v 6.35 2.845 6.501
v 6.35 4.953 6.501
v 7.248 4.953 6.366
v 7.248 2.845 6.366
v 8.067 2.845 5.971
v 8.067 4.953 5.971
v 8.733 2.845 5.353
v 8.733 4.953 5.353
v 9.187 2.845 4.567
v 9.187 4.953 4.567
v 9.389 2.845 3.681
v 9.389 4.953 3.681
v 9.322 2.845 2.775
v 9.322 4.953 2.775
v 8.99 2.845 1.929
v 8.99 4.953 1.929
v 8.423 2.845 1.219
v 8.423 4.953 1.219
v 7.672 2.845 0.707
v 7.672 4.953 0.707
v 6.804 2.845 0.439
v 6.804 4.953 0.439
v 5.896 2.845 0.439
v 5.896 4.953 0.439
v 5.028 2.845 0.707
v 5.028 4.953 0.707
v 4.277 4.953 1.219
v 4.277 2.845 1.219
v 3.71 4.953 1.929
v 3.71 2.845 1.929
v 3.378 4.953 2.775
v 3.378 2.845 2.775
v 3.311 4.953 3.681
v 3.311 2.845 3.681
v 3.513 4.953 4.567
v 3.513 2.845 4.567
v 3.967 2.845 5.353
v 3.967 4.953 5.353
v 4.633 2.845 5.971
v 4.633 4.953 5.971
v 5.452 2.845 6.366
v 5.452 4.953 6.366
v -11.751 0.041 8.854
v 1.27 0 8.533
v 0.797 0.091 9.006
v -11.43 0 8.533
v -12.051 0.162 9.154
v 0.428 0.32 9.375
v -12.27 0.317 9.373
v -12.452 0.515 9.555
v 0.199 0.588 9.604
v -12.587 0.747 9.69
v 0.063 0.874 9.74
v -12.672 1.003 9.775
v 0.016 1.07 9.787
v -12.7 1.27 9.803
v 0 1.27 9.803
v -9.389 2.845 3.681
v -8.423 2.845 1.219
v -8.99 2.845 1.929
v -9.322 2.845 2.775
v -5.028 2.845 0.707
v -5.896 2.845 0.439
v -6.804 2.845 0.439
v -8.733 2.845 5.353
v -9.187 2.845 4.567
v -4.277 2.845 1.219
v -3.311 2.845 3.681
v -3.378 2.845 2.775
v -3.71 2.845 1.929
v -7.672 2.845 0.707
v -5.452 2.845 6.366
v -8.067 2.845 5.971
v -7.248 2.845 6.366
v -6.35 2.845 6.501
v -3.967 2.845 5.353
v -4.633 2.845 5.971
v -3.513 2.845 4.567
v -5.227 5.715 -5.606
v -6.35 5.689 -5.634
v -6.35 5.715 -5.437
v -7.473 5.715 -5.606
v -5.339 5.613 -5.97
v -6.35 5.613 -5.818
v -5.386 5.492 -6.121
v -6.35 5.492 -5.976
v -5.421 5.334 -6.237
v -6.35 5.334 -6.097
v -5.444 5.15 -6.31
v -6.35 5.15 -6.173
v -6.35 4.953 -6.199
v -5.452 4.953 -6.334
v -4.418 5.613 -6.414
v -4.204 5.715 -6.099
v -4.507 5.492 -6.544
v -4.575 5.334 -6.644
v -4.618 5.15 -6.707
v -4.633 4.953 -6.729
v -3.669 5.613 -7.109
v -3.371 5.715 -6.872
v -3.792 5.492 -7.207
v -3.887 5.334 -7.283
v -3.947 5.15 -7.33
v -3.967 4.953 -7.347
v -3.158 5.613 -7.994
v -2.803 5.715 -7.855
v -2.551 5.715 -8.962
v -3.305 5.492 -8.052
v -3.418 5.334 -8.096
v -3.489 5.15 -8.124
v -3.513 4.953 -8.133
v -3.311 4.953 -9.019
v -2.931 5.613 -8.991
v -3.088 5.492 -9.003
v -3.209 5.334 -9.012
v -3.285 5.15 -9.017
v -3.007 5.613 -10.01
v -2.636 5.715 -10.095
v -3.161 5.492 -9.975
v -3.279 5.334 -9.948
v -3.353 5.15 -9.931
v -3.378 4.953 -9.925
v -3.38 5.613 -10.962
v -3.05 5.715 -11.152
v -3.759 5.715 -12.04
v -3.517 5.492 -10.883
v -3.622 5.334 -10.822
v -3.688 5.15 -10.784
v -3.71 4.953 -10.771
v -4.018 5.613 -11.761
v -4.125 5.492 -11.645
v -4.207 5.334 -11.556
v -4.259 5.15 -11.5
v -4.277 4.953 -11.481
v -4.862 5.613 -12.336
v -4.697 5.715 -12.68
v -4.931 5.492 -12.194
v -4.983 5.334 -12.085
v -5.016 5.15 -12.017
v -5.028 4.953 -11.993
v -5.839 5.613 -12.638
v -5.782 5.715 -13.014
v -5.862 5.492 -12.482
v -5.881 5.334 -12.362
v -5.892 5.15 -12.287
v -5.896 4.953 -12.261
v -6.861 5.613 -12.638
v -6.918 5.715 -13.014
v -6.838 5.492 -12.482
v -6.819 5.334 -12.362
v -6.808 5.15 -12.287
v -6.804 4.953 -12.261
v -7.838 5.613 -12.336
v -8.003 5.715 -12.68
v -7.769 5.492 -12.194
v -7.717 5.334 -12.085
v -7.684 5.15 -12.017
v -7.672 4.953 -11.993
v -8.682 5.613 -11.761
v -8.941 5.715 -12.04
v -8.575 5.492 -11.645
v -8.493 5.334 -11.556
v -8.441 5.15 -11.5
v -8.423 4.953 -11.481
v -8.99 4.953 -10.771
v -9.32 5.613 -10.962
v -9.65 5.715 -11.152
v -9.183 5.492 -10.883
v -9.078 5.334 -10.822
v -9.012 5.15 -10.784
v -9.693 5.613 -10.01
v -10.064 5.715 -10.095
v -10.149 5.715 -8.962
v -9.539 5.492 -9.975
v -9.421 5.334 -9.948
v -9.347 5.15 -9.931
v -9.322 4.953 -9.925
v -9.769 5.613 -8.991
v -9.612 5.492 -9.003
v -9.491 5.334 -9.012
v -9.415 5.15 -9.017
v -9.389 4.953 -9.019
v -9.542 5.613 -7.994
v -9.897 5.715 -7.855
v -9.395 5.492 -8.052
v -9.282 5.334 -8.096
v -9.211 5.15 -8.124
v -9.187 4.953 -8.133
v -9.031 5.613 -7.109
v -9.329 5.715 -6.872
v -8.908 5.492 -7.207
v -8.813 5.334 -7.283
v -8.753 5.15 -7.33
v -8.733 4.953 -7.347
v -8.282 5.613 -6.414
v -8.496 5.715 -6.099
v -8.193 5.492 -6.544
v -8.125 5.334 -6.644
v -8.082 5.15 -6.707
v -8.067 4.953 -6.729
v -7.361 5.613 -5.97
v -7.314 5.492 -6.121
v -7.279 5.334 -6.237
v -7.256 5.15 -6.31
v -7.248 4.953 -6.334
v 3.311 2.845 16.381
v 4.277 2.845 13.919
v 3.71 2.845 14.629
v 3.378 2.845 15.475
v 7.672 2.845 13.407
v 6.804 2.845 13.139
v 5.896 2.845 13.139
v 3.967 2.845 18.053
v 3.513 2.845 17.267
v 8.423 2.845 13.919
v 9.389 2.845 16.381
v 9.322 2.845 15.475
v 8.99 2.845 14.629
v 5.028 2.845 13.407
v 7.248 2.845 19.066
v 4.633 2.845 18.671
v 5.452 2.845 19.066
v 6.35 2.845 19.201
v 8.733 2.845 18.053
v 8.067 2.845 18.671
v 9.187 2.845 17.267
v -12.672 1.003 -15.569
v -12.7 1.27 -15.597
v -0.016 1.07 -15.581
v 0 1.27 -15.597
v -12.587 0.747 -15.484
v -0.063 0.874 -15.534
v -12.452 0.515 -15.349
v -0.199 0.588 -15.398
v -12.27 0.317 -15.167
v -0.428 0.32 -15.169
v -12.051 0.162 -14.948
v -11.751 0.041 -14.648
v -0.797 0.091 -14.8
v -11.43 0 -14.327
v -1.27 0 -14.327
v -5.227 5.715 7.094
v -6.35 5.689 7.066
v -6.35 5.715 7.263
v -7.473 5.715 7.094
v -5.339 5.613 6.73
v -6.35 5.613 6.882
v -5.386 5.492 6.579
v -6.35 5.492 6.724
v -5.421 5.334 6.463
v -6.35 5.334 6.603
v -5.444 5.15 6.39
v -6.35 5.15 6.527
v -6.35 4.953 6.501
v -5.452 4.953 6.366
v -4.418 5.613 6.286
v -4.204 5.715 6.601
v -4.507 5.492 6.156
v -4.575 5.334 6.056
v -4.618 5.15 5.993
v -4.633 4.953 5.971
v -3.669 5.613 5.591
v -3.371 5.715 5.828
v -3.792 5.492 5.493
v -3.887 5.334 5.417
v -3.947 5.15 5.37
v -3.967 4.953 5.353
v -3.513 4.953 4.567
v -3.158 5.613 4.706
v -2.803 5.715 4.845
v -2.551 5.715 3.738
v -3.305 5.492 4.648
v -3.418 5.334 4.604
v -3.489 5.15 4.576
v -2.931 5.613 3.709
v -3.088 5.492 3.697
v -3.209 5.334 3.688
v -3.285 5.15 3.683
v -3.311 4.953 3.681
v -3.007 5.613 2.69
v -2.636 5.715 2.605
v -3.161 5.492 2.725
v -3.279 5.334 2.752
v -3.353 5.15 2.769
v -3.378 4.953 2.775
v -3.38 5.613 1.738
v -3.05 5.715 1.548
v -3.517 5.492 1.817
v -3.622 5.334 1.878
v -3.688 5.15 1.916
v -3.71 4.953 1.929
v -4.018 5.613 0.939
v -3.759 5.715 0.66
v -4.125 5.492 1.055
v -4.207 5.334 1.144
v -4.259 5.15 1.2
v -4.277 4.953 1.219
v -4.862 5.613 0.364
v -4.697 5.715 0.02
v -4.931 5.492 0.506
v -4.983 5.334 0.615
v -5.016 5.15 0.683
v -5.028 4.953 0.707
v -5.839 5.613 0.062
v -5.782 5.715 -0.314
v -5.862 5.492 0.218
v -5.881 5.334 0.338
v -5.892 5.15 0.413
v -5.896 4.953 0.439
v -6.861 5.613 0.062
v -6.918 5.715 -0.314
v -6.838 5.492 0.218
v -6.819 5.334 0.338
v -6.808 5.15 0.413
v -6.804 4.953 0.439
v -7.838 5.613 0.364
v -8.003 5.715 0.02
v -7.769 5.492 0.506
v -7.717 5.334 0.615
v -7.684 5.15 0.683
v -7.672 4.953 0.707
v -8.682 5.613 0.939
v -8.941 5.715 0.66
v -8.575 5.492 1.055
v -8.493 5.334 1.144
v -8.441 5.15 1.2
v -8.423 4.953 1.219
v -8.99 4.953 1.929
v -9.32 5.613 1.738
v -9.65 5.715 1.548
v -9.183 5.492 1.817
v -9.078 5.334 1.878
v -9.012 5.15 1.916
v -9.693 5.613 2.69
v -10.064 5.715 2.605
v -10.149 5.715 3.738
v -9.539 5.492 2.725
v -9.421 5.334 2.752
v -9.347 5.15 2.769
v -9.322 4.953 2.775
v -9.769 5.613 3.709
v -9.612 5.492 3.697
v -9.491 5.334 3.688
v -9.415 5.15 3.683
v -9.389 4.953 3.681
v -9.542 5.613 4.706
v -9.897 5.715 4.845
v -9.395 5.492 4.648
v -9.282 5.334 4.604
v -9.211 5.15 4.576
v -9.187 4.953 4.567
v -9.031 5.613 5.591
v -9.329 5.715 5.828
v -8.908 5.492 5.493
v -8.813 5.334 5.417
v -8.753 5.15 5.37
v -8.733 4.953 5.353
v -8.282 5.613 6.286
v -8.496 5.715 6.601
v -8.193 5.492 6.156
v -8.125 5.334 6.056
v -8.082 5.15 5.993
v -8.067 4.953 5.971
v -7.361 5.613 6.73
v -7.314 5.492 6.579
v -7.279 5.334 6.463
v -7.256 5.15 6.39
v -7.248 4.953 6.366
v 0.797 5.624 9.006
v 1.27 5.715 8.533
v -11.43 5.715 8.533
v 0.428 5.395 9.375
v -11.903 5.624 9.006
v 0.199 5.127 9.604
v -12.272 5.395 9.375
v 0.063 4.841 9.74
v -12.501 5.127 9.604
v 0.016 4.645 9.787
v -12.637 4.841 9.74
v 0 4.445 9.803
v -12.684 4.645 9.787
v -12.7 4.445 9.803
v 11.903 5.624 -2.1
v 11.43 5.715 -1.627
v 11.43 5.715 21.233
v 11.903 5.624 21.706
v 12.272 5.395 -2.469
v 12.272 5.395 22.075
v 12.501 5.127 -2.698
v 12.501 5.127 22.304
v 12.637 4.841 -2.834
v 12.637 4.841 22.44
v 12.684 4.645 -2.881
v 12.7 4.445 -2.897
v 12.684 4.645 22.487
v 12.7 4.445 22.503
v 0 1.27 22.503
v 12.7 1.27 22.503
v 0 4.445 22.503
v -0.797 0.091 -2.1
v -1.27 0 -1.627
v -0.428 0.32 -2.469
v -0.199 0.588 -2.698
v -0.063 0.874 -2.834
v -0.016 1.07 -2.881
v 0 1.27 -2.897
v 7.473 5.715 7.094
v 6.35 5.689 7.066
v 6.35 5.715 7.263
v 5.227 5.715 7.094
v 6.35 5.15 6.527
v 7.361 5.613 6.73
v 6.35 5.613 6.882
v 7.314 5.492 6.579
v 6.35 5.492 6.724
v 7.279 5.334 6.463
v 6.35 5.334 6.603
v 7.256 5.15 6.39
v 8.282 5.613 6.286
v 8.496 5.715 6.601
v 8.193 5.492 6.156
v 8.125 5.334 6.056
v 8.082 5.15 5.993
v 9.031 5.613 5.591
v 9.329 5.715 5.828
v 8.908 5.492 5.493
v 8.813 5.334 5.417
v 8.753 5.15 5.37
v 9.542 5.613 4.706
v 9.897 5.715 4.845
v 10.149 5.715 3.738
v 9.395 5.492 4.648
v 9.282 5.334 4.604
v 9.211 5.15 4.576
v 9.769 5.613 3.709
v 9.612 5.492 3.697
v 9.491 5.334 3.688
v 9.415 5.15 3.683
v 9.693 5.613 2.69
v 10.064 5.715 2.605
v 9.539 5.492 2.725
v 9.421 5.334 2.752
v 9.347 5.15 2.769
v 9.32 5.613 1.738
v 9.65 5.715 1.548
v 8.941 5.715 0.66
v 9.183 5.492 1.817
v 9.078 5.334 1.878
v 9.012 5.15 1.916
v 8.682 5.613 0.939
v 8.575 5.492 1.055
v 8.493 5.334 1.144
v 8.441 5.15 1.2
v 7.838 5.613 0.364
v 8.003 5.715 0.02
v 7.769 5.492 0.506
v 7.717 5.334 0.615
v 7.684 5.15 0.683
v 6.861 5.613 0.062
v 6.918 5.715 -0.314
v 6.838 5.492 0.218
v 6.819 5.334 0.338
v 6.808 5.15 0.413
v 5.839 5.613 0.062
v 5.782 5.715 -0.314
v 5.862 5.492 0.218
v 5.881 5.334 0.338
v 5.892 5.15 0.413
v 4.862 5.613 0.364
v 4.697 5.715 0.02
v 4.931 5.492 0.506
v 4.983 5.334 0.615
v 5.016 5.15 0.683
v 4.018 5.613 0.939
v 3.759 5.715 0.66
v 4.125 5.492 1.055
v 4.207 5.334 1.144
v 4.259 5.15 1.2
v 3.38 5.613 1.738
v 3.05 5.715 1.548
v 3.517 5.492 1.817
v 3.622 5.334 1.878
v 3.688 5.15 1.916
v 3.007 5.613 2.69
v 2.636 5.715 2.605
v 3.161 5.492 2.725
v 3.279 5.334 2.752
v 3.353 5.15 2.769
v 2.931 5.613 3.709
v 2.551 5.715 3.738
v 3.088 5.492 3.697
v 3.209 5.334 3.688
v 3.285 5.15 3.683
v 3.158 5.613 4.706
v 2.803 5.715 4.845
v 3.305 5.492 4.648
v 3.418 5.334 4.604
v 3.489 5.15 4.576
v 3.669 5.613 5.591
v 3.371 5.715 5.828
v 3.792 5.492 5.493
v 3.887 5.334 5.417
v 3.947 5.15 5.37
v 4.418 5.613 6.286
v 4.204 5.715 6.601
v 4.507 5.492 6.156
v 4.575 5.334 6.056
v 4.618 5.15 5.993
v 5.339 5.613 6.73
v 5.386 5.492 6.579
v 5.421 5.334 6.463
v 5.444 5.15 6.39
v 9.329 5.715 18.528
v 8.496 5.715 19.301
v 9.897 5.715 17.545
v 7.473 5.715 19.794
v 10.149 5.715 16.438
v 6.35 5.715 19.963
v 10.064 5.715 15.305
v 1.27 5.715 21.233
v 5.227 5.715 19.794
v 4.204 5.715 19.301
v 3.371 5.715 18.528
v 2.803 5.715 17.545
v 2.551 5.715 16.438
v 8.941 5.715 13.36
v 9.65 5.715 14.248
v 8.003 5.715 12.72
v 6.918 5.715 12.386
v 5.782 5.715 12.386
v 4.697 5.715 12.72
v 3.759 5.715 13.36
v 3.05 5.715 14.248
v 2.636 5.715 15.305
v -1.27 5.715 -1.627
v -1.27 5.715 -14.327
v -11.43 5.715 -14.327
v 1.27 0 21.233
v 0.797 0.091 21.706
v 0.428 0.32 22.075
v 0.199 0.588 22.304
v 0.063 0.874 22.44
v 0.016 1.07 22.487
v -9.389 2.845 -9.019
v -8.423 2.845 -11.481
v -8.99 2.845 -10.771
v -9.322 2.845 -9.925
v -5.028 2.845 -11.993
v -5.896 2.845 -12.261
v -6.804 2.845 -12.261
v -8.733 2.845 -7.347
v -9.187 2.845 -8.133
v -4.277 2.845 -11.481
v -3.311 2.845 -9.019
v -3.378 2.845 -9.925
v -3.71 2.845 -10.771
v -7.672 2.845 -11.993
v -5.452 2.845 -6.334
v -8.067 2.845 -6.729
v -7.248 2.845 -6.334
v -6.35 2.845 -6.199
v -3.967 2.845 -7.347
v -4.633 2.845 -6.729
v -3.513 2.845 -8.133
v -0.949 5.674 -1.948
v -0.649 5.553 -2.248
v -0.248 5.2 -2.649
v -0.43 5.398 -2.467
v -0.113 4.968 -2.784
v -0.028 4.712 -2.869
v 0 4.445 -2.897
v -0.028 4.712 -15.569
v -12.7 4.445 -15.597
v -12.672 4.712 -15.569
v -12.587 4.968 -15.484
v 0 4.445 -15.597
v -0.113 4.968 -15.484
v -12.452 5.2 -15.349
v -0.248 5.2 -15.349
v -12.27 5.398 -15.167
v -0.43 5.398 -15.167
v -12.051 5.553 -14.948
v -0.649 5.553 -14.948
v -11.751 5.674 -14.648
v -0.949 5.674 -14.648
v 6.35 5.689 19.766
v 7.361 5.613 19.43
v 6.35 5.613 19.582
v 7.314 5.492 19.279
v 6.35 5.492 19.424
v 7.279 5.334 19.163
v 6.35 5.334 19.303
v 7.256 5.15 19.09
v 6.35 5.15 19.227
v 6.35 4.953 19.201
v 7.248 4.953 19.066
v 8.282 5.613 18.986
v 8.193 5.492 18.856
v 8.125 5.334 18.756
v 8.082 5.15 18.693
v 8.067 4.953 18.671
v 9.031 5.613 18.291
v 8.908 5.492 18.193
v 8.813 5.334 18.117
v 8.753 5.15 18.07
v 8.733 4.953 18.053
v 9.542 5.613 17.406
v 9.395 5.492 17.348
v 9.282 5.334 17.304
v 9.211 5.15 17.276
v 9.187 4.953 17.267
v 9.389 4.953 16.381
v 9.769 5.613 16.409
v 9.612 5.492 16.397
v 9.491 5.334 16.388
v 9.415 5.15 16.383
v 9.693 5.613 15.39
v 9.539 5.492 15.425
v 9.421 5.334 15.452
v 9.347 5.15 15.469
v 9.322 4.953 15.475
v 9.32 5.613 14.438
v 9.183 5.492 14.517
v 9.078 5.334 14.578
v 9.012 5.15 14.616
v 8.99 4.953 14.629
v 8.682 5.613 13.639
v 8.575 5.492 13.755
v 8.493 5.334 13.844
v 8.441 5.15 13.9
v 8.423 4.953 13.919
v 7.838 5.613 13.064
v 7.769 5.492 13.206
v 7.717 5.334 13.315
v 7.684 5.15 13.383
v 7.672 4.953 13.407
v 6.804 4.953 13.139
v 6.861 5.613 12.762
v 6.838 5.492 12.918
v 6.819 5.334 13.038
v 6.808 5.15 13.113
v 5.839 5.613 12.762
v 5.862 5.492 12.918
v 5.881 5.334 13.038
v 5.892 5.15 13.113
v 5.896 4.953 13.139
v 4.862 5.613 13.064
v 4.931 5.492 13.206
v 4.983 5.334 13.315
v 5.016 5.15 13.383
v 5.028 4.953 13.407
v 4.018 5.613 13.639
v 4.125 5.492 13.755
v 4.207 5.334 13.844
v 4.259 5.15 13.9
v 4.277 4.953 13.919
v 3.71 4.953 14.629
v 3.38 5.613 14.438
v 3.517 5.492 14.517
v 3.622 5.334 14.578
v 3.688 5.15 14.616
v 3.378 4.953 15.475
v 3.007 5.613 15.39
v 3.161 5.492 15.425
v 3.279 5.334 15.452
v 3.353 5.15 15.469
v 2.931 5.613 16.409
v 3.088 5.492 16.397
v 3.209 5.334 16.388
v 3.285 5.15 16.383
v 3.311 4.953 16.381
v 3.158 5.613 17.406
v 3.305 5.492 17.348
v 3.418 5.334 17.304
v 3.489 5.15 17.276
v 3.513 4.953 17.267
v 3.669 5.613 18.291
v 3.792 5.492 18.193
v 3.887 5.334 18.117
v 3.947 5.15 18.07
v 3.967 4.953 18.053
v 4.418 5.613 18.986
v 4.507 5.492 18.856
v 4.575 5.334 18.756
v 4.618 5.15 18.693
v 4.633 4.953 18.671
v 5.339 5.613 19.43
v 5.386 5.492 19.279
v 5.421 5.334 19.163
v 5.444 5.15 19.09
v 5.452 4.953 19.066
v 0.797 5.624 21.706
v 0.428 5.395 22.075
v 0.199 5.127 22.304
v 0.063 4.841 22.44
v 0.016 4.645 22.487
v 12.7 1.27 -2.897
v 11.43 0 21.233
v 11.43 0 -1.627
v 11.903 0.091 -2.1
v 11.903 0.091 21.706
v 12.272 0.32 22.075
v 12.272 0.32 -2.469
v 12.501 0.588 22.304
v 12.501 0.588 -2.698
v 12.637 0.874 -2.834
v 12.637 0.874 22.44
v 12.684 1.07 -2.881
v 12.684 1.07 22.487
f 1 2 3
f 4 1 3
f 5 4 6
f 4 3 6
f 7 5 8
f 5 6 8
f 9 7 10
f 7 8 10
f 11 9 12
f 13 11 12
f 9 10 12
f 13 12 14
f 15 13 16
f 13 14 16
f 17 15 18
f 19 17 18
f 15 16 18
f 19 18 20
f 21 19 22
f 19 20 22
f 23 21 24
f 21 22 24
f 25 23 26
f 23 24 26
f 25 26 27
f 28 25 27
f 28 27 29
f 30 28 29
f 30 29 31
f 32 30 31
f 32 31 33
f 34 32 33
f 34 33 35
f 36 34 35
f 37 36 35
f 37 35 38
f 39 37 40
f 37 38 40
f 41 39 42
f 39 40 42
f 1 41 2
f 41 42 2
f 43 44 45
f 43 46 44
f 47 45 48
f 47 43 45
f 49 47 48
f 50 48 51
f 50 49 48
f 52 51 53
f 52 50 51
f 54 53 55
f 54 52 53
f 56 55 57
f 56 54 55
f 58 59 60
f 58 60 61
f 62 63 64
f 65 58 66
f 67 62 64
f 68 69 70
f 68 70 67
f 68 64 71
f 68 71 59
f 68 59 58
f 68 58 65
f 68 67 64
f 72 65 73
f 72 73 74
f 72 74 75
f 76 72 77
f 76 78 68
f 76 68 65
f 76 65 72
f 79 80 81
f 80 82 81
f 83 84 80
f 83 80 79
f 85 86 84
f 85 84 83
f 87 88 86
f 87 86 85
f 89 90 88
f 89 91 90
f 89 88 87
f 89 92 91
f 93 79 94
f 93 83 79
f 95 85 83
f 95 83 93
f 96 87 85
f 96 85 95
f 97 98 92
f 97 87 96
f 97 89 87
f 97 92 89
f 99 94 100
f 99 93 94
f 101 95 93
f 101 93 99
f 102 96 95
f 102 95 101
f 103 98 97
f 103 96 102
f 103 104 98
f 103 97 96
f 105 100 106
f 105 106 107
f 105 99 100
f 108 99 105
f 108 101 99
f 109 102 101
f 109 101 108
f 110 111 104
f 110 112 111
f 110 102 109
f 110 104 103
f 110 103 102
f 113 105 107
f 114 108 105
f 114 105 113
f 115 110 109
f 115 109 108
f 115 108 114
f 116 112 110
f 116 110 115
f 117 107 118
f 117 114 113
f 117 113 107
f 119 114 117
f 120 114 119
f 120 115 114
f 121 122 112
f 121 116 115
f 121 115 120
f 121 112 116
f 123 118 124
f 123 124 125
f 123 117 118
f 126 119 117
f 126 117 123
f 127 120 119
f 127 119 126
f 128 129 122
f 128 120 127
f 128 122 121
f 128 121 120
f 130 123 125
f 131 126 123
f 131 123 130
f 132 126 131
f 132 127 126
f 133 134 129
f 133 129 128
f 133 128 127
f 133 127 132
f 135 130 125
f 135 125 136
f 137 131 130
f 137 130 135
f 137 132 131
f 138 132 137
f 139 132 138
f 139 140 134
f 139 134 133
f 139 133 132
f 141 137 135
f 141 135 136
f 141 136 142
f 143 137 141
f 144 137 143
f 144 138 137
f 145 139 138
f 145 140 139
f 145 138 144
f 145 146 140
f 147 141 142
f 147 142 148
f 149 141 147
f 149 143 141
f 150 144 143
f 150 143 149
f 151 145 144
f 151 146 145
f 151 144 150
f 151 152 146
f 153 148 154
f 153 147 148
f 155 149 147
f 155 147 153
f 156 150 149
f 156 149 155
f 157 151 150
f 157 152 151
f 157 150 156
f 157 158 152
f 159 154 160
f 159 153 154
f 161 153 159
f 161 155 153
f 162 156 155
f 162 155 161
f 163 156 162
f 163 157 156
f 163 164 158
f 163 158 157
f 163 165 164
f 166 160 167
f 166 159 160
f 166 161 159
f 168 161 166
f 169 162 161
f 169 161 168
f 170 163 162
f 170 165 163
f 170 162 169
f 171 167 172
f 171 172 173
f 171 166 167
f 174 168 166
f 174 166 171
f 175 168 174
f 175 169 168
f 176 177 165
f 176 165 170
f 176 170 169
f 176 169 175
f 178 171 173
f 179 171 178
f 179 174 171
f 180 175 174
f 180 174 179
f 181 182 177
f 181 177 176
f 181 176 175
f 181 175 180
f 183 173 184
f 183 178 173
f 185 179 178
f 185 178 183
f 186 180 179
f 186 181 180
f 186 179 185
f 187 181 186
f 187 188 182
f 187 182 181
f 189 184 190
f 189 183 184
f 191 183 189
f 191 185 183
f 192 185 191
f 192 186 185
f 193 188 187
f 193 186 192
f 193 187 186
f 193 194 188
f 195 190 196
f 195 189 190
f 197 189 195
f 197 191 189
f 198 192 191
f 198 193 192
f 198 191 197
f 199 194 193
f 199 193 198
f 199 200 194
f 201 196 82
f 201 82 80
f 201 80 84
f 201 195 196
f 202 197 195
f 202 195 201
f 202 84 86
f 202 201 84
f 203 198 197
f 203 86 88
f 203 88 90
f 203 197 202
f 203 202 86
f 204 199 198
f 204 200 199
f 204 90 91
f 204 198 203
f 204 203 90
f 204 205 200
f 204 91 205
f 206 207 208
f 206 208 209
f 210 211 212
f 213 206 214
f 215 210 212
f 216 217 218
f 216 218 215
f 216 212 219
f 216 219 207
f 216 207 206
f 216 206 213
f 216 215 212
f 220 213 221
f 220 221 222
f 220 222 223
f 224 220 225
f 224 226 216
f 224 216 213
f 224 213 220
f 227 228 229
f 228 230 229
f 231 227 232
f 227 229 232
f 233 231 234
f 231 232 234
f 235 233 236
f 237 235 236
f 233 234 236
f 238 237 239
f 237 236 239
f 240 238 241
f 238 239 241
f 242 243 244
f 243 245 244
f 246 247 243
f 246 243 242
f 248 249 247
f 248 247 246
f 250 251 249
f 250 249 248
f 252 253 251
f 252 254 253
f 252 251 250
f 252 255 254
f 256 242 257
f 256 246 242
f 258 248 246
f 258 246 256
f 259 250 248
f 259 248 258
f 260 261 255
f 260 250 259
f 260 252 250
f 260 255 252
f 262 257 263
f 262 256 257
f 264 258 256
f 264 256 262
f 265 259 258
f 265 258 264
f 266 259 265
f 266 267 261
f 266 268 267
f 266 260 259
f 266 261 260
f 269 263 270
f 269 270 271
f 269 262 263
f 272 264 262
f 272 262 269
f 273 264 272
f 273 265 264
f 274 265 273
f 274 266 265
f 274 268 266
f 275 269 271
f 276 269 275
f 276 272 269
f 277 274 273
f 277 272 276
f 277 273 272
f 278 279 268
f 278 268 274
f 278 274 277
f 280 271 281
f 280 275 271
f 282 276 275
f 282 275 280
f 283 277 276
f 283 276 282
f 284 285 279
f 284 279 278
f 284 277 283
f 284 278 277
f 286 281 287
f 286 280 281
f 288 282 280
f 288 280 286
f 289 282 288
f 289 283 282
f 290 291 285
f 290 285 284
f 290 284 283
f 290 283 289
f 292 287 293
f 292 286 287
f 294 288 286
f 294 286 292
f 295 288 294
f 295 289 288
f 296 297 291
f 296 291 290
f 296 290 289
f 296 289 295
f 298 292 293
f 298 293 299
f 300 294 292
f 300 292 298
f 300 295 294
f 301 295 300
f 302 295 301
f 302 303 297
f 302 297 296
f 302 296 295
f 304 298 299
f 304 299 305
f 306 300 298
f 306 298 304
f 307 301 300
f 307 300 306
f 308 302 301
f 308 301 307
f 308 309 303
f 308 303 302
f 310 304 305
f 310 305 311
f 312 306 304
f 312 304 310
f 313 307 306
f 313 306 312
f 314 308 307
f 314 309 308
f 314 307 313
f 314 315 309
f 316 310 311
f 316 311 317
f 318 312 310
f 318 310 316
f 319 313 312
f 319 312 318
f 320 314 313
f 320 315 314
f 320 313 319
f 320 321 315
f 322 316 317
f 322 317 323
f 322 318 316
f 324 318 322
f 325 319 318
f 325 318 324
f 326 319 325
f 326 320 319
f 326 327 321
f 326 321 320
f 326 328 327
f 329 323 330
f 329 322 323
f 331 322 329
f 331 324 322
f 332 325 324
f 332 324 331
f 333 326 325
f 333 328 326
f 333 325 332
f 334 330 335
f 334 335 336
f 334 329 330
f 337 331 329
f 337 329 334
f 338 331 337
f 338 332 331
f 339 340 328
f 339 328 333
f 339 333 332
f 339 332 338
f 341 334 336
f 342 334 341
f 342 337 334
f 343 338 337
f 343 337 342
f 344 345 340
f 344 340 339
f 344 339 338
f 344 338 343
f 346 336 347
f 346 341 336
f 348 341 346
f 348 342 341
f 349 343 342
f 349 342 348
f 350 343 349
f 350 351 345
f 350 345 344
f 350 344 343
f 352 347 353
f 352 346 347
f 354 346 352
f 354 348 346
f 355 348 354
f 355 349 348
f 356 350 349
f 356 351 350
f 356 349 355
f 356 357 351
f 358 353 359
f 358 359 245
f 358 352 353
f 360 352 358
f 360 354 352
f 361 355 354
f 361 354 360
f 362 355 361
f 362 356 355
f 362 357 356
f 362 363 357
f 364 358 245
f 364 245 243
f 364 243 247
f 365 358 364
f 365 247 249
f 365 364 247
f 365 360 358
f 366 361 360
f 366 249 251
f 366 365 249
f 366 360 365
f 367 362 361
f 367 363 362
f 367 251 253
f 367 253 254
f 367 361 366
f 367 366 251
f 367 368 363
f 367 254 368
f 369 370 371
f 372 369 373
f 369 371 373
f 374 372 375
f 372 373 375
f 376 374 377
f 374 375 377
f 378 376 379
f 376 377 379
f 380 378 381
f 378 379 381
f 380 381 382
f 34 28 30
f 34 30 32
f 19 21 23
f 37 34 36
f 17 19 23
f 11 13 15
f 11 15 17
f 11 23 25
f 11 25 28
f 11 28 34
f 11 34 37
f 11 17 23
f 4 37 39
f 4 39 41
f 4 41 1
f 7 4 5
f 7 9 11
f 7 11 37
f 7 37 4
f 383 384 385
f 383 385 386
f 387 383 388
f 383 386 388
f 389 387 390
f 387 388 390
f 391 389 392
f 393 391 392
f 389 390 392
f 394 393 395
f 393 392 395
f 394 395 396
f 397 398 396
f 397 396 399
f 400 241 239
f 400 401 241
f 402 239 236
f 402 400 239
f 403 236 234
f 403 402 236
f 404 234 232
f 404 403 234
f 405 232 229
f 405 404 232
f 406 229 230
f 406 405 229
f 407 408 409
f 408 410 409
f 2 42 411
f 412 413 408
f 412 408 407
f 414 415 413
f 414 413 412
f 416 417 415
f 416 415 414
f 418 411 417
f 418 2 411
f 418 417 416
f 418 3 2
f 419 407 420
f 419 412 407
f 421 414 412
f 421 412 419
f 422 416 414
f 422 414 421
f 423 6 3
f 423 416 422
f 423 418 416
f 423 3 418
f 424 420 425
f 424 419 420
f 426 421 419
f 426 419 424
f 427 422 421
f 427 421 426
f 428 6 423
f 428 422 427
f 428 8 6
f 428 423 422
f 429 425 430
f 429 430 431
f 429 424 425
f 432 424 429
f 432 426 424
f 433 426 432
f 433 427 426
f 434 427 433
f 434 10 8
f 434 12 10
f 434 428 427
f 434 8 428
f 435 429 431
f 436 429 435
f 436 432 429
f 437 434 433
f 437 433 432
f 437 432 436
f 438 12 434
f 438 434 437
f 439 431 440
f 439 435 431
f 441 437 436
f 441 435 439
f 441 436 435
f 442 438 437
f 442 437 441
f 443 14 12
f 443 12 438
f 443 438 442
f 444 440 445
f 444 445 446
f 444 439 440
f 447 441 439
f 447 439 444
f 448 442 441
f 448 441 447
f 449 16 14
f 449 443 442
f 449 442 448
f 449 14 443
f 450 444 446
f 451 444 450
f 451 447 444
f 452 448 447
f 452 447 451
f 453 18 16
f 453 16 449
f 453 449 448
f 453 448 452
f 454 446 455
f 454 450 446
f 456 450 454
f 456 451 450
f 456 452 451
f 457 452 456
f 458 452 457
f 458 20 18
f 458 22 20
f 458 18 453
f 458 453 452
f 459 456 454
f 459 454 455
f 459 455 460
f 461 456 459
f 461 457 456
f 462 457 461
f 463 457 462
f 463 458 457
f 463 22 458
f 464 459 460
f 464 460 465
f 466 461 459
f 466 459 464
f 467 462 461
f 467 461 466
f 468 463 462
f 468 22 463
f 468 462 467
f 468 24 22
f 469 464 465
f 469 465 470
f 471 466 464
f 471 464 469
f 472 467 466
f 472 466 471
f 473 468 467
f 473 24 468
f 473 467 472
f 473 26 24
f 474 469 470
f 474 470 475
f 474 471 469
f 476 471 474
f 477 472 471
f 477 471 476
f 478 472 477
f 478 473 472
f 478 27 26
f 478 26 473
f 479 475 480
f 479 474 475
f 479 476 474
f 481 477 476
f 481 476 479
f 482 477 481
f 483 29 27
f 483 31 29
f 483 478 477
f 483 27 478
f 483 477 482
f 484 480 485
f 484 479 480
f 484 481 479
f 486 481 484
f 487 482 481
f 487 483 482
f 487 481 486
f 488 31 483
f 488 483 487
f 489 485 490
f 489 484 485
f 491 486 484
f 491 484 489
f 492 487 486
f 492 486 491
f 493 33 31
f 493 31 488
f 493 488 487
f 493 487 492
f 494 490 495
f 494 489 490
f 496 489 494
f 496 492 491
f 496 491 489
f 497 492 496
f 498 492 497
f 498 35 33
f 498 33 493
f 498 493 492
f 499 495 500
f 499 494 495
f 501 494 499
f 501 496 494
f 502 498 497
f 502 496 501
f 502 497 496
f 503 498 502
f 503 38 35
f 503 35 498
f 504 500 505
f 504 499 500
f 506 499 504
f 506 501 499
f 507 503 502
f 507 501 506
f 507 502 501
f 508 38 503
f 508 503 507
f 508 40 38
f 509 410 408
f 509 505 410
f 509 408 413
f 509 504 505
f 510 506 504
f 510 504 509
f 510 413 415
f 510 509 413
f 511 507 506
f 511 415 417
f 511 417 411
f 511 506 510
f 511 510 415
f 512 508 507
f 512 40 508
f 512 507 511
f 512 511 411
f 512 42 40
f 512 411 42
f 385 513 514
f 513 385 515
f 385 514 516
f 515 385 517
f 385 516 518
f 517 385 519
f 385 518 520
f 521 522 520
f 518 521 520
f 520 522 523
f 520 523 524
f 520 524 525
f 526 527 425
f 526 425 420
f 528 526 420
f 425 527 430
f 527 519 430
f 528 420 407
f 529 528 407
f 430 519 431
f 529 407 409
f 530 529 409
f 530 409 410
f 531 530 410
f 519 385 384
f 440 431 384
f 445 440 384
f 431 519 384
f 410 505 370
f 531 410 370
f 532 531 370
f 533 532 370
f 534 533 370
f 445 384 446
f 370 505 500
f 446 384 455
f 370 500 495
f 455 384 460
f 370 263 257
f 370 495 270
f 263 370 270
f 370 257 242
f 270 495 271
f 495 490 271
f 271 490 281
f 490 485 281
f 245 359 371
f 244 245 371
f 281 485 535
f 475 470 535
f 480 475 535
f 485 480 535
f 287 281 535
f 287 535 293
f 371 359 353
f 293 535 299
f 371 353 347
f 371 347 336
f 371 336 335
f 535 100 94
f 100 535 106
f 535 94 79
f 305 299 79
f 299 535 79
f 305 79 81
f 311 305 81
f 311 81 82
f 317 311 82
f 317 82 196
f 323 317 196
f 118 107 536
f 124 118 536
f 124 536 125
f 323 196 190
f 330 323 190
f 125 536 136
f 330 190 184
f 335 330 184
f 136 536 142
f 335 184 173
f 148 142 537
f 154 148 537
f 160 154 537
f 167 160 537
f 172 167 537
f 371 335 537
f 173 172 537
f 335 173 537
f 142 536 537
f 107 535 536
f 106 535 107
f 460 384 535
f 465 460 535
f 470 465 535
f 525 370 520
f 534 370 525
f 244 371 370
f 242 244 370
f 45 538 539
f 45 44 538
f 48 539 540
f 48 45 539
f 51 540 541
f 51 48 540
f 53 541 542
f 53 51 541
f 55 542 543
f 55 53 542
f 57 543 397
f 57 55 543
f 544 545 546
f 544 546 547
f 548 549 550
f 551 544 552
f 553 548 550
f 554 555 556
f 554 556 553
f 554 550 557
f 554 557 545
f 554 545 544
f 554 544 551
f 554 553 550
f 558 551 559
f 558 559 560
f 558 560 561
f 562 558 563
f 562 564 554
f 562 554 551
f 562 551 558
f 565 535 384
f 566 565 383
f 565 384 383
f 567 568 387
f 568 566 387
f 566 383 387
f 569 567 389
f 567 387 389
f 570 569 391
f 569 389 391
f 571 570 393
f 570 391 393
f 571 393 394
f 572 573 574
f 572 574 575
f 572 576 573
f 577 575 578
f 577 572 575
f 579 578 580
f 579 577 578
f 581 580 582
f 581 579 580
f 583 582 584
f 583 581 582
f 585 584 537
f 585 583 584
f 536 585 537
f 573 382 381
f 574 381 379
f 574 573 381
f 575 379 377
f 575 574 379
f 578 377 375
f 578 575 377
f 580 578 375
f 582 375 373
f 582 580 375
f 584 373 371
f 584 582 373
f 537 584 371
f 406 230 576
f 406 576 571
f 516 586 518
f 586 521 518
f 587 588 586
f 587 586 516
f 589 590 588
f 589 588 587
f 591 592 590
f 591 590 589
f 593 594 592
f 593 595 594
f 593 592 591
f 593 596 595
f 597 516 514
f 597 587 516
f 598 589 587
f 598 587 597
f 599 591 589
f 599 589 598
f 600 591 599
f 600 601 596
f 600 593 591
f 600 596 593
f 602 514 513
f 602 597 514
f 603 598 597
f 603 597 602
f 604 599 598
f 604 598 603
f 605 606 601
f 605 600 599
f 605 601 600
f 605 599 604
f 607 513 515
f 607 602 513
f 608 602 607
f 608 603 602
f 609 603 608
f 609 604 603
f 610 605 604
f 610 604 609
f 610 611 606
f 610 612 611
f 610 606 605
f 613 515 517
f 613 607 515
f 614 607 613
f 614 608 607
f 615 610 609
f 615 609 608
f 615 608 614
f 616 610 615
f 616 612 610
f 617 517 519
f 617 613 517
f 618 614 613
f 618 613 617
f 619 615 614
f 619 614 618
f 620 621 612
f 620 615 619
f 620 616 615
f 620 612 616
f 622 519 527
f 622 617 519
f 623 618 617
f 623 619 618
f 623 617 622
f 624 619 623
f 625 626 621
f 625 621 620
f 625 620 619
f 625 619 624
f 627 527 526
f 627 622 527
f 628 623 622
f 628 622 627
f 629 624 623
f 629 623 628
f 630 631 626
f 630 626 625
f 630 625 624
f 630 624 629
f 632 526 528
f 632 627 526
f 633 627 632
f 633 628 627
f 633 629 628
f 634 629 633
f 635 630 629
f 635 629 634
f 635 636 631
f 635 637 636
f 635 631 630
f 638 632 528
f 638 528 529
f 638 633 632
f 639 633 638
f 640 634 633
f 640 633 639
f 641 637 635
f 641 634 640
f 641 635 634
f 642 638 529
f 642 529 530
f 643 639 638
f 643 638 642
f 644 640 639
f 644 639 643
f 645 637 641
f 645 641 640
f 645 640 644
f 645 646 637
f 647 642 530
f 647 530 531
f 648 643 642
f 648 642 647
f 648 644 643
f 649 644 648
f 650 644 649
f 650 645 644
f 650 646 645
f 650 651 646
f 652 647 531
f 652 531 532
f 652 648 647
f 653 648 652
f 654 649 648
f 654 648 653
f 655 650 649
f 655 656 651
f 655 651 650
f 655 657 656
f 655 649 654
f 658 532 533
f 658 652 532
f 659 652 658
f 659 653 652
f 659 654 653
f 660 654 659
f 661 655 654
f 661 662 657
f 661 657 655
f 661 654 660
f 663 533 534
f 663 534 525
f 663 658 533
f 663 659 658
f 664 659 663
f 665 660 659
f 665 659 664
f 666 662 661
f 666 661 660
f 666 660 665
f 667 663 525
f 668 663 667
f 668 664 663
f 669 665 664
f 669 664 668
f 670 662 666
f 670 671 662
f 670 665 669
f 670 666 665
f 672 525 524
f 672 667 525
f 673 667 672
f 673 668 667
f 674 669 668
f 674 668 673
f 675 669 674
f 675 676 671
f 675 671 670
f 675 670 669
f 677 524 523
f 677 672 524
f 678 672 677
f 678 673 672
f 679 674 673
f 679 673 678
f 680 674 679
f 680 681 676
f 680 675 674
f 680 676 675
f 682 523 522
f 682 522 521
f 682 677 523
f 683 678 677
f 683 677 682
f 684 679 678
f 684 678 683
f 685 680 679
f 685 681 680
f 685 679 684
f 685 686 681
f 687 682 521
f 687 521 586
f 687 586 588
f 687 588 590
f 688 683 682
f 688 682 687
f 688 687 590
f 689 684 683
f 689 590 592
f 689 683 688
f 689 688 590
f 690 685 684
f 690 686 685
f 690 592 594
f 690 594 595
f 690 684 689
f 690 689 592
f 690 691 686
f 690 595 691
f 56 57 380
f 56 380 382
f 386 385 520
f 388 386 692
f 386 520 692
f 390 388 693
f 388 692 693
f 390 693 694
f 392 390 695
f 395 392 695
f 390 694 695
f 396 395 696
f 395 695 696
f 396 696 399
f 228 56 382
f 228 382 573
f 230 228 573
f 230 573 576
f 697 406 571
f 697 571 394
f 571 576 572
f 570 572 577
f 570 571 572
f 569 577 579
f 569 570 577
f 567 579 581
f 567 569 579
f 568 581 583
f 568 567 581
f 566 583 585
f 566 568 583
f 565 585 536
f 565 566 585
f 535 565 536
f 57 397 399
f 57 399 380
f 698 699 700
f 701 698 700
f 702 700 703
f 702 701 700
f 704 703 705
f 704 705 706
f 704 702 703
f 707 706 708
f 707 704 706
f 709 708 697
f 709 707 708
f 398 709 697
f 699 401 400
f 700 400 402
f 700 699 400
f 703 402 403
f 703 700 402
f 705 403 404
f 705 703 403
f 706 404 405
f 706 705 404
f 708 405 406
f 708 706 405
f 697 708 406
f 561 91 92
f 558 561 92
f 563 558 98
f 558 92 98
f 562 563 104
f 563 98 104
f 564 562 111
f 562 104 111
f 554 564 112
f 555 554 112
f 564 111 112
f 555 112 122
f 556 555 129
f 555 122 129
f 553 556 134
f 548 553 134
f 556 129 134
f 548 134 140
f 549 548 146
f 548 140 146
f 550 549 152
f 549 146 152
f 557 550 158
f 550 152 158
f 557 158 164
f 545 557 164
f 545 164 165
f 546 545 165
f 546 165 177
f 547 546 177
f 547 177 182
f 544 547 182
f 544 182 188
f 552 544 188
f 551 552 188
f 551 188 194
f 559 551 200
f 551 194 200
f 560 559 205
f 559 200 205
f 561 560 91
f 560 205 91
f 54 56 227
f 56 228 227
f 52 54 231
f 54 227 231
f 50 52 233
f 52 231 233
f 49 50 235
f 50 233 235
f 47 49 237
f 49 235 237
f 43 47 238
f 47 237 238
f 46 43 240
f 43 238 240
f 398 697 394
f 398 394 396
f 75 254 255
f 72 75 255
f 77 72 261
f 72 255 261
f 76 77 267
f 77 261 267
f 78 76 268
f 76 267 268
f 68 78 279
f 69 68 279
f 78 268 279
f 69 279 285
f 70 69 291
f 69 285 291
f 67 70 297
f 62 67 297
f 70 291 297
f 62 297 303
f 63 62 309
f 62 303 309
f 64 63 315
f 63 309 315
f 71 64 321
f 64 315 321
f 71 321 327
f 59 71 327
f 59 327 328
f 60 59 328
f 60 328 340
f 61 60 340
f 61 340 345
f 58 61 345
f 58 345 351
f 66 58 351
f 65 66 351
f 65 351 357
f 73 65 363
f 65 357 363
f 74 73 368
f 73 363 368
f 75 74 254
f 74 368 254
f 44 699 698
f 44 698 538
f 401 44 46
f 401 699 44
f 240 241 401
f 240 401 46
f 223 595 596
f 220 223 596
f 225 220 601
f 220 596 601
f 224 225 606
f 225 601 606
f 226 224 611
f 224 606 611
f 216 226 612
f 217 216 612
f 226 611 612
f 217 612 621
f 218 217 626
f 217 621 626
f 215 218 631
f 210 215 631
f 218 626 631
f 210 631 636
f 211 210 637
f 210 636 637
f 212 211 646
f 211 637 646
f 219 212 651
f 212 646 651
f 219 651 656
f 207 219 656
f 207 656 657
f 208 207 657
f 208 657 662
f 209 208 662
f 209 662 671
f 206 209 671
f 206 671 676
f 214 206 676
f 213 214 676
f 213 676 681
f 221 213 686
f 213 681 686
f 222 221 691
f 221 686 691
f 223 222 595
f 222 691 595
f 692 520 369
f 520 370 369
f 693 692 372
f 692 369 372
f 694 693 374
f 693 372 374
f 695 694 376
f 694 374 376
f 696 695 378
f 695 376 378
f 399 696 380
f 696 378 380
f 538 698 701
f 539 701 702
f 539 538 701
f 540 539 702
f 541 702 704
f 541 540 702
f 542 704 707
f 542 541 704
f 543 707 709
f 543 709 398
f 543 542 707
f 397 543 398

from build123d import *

# Parameters (mm, degrees)
BOSS_EXTRUDE2_DEPTH = 5.715
SKETCH2_R           = 3.048
CUT_EXTRUDE1_DEPTH  = 2.8702
FILLET1_R           = 1.27
FILLET2_R           = 1.27
FILLET3_R           = 0.762


with BuildPart() as part:
    # Sketch1 → Boss-Extrude2 (new body)
    with BuildSketch(Plane(origin=(0, 0, 0), x_dir=(1, 0, 0), z_dir=(0, 1, 0))):
        Polygon((-12.7, 15.59701387), (0, 15.59701387), (0, 2.89701387), (12.7, 2.89701387), (12.7, -22.50298613), (0, -22.50298613), (0, -9.80298613), (-12.7, -9.80298613), align=None)
    extrude(amount=BOSS_EXTRUDE2_DEPTH)

    # Sketch2 → Cut-Extrude1 (cut)
    with BuildSketch(Plane(origin=(0, 5.715, 0), x_dir=(1, 0, 0), z_dir=(0, 1, 0))):
        with Locations(Location((-6.35, 9.24701387, 0), (0, 0, 270))):
            Circle(SKETCH2_R)
        with Locations(Location((6.35, -16.15298613, 0), (0, 0, 270))):
            Circle(SKETCH2_R)
        with Locations(Location((-6.35, -3.45298613, 0), (0, 0, 270))):
            Circle(SKETCH2_R)
        with Locations(Location((6.35, -3.45298613, 0), (0, 0, 270))):
            Circle(SKETCH2_R)
    extrude(amount=-CUT_EXTRUDE1_DEPTH, mode=Mode.SUBTRACT)

    # Fillet1
    fillet1_edges = [part.edges().sort_by_distance(p)[0] for p in [
        (-6.35, 5.715, -15.59701387),
        (0, 5.715, -9.24701387),
        (6.35, 5.715, -2.89701387),
        (12.7, 5.715, 9.80298613),
        (6.35, 5.715, 22.50298613),
        (0, 5.715, 16.15298613),
        (-6.35, 5.715, 9.80298613),
        (-12.7, 5.715, -2.89701387),
    ]]
    fillet(fillet1_edges, radius=FILLET1_R)

    # Fillet2
    fillet2_edges = [part.edges().sort_by_distance(p)[0] for p in [
        (-12.7, 0, -2.89701387),
        (-6.35, 0, 9.80298613),
        (0, 0, 16.15298613),
        (6.35, 0, 22.50298613),
        (12.7, 0, 9.80298613),
        (6.35, 0, -2.89701387),
        (0, 0, -9.24701387),
        (-6.35, 0, -15.59701387),
    ]]
    fillet(fillet2_edges, radius=FILLET2_R)

    # Fillet3
    fillet3_edges = [part.edges().sort_by_distance(p)[0] for p in [
        (-6.35, 5.715, -12.29501387),
        (6.35, 5.715, 0.40498613),
        (-6.35, 5.715, 0.40498613),
        (6.35, 5.715, 13.10498613),
    ]]
    fillet(fillet3_edges, radius=FILLET3_R)


solid = part.part
